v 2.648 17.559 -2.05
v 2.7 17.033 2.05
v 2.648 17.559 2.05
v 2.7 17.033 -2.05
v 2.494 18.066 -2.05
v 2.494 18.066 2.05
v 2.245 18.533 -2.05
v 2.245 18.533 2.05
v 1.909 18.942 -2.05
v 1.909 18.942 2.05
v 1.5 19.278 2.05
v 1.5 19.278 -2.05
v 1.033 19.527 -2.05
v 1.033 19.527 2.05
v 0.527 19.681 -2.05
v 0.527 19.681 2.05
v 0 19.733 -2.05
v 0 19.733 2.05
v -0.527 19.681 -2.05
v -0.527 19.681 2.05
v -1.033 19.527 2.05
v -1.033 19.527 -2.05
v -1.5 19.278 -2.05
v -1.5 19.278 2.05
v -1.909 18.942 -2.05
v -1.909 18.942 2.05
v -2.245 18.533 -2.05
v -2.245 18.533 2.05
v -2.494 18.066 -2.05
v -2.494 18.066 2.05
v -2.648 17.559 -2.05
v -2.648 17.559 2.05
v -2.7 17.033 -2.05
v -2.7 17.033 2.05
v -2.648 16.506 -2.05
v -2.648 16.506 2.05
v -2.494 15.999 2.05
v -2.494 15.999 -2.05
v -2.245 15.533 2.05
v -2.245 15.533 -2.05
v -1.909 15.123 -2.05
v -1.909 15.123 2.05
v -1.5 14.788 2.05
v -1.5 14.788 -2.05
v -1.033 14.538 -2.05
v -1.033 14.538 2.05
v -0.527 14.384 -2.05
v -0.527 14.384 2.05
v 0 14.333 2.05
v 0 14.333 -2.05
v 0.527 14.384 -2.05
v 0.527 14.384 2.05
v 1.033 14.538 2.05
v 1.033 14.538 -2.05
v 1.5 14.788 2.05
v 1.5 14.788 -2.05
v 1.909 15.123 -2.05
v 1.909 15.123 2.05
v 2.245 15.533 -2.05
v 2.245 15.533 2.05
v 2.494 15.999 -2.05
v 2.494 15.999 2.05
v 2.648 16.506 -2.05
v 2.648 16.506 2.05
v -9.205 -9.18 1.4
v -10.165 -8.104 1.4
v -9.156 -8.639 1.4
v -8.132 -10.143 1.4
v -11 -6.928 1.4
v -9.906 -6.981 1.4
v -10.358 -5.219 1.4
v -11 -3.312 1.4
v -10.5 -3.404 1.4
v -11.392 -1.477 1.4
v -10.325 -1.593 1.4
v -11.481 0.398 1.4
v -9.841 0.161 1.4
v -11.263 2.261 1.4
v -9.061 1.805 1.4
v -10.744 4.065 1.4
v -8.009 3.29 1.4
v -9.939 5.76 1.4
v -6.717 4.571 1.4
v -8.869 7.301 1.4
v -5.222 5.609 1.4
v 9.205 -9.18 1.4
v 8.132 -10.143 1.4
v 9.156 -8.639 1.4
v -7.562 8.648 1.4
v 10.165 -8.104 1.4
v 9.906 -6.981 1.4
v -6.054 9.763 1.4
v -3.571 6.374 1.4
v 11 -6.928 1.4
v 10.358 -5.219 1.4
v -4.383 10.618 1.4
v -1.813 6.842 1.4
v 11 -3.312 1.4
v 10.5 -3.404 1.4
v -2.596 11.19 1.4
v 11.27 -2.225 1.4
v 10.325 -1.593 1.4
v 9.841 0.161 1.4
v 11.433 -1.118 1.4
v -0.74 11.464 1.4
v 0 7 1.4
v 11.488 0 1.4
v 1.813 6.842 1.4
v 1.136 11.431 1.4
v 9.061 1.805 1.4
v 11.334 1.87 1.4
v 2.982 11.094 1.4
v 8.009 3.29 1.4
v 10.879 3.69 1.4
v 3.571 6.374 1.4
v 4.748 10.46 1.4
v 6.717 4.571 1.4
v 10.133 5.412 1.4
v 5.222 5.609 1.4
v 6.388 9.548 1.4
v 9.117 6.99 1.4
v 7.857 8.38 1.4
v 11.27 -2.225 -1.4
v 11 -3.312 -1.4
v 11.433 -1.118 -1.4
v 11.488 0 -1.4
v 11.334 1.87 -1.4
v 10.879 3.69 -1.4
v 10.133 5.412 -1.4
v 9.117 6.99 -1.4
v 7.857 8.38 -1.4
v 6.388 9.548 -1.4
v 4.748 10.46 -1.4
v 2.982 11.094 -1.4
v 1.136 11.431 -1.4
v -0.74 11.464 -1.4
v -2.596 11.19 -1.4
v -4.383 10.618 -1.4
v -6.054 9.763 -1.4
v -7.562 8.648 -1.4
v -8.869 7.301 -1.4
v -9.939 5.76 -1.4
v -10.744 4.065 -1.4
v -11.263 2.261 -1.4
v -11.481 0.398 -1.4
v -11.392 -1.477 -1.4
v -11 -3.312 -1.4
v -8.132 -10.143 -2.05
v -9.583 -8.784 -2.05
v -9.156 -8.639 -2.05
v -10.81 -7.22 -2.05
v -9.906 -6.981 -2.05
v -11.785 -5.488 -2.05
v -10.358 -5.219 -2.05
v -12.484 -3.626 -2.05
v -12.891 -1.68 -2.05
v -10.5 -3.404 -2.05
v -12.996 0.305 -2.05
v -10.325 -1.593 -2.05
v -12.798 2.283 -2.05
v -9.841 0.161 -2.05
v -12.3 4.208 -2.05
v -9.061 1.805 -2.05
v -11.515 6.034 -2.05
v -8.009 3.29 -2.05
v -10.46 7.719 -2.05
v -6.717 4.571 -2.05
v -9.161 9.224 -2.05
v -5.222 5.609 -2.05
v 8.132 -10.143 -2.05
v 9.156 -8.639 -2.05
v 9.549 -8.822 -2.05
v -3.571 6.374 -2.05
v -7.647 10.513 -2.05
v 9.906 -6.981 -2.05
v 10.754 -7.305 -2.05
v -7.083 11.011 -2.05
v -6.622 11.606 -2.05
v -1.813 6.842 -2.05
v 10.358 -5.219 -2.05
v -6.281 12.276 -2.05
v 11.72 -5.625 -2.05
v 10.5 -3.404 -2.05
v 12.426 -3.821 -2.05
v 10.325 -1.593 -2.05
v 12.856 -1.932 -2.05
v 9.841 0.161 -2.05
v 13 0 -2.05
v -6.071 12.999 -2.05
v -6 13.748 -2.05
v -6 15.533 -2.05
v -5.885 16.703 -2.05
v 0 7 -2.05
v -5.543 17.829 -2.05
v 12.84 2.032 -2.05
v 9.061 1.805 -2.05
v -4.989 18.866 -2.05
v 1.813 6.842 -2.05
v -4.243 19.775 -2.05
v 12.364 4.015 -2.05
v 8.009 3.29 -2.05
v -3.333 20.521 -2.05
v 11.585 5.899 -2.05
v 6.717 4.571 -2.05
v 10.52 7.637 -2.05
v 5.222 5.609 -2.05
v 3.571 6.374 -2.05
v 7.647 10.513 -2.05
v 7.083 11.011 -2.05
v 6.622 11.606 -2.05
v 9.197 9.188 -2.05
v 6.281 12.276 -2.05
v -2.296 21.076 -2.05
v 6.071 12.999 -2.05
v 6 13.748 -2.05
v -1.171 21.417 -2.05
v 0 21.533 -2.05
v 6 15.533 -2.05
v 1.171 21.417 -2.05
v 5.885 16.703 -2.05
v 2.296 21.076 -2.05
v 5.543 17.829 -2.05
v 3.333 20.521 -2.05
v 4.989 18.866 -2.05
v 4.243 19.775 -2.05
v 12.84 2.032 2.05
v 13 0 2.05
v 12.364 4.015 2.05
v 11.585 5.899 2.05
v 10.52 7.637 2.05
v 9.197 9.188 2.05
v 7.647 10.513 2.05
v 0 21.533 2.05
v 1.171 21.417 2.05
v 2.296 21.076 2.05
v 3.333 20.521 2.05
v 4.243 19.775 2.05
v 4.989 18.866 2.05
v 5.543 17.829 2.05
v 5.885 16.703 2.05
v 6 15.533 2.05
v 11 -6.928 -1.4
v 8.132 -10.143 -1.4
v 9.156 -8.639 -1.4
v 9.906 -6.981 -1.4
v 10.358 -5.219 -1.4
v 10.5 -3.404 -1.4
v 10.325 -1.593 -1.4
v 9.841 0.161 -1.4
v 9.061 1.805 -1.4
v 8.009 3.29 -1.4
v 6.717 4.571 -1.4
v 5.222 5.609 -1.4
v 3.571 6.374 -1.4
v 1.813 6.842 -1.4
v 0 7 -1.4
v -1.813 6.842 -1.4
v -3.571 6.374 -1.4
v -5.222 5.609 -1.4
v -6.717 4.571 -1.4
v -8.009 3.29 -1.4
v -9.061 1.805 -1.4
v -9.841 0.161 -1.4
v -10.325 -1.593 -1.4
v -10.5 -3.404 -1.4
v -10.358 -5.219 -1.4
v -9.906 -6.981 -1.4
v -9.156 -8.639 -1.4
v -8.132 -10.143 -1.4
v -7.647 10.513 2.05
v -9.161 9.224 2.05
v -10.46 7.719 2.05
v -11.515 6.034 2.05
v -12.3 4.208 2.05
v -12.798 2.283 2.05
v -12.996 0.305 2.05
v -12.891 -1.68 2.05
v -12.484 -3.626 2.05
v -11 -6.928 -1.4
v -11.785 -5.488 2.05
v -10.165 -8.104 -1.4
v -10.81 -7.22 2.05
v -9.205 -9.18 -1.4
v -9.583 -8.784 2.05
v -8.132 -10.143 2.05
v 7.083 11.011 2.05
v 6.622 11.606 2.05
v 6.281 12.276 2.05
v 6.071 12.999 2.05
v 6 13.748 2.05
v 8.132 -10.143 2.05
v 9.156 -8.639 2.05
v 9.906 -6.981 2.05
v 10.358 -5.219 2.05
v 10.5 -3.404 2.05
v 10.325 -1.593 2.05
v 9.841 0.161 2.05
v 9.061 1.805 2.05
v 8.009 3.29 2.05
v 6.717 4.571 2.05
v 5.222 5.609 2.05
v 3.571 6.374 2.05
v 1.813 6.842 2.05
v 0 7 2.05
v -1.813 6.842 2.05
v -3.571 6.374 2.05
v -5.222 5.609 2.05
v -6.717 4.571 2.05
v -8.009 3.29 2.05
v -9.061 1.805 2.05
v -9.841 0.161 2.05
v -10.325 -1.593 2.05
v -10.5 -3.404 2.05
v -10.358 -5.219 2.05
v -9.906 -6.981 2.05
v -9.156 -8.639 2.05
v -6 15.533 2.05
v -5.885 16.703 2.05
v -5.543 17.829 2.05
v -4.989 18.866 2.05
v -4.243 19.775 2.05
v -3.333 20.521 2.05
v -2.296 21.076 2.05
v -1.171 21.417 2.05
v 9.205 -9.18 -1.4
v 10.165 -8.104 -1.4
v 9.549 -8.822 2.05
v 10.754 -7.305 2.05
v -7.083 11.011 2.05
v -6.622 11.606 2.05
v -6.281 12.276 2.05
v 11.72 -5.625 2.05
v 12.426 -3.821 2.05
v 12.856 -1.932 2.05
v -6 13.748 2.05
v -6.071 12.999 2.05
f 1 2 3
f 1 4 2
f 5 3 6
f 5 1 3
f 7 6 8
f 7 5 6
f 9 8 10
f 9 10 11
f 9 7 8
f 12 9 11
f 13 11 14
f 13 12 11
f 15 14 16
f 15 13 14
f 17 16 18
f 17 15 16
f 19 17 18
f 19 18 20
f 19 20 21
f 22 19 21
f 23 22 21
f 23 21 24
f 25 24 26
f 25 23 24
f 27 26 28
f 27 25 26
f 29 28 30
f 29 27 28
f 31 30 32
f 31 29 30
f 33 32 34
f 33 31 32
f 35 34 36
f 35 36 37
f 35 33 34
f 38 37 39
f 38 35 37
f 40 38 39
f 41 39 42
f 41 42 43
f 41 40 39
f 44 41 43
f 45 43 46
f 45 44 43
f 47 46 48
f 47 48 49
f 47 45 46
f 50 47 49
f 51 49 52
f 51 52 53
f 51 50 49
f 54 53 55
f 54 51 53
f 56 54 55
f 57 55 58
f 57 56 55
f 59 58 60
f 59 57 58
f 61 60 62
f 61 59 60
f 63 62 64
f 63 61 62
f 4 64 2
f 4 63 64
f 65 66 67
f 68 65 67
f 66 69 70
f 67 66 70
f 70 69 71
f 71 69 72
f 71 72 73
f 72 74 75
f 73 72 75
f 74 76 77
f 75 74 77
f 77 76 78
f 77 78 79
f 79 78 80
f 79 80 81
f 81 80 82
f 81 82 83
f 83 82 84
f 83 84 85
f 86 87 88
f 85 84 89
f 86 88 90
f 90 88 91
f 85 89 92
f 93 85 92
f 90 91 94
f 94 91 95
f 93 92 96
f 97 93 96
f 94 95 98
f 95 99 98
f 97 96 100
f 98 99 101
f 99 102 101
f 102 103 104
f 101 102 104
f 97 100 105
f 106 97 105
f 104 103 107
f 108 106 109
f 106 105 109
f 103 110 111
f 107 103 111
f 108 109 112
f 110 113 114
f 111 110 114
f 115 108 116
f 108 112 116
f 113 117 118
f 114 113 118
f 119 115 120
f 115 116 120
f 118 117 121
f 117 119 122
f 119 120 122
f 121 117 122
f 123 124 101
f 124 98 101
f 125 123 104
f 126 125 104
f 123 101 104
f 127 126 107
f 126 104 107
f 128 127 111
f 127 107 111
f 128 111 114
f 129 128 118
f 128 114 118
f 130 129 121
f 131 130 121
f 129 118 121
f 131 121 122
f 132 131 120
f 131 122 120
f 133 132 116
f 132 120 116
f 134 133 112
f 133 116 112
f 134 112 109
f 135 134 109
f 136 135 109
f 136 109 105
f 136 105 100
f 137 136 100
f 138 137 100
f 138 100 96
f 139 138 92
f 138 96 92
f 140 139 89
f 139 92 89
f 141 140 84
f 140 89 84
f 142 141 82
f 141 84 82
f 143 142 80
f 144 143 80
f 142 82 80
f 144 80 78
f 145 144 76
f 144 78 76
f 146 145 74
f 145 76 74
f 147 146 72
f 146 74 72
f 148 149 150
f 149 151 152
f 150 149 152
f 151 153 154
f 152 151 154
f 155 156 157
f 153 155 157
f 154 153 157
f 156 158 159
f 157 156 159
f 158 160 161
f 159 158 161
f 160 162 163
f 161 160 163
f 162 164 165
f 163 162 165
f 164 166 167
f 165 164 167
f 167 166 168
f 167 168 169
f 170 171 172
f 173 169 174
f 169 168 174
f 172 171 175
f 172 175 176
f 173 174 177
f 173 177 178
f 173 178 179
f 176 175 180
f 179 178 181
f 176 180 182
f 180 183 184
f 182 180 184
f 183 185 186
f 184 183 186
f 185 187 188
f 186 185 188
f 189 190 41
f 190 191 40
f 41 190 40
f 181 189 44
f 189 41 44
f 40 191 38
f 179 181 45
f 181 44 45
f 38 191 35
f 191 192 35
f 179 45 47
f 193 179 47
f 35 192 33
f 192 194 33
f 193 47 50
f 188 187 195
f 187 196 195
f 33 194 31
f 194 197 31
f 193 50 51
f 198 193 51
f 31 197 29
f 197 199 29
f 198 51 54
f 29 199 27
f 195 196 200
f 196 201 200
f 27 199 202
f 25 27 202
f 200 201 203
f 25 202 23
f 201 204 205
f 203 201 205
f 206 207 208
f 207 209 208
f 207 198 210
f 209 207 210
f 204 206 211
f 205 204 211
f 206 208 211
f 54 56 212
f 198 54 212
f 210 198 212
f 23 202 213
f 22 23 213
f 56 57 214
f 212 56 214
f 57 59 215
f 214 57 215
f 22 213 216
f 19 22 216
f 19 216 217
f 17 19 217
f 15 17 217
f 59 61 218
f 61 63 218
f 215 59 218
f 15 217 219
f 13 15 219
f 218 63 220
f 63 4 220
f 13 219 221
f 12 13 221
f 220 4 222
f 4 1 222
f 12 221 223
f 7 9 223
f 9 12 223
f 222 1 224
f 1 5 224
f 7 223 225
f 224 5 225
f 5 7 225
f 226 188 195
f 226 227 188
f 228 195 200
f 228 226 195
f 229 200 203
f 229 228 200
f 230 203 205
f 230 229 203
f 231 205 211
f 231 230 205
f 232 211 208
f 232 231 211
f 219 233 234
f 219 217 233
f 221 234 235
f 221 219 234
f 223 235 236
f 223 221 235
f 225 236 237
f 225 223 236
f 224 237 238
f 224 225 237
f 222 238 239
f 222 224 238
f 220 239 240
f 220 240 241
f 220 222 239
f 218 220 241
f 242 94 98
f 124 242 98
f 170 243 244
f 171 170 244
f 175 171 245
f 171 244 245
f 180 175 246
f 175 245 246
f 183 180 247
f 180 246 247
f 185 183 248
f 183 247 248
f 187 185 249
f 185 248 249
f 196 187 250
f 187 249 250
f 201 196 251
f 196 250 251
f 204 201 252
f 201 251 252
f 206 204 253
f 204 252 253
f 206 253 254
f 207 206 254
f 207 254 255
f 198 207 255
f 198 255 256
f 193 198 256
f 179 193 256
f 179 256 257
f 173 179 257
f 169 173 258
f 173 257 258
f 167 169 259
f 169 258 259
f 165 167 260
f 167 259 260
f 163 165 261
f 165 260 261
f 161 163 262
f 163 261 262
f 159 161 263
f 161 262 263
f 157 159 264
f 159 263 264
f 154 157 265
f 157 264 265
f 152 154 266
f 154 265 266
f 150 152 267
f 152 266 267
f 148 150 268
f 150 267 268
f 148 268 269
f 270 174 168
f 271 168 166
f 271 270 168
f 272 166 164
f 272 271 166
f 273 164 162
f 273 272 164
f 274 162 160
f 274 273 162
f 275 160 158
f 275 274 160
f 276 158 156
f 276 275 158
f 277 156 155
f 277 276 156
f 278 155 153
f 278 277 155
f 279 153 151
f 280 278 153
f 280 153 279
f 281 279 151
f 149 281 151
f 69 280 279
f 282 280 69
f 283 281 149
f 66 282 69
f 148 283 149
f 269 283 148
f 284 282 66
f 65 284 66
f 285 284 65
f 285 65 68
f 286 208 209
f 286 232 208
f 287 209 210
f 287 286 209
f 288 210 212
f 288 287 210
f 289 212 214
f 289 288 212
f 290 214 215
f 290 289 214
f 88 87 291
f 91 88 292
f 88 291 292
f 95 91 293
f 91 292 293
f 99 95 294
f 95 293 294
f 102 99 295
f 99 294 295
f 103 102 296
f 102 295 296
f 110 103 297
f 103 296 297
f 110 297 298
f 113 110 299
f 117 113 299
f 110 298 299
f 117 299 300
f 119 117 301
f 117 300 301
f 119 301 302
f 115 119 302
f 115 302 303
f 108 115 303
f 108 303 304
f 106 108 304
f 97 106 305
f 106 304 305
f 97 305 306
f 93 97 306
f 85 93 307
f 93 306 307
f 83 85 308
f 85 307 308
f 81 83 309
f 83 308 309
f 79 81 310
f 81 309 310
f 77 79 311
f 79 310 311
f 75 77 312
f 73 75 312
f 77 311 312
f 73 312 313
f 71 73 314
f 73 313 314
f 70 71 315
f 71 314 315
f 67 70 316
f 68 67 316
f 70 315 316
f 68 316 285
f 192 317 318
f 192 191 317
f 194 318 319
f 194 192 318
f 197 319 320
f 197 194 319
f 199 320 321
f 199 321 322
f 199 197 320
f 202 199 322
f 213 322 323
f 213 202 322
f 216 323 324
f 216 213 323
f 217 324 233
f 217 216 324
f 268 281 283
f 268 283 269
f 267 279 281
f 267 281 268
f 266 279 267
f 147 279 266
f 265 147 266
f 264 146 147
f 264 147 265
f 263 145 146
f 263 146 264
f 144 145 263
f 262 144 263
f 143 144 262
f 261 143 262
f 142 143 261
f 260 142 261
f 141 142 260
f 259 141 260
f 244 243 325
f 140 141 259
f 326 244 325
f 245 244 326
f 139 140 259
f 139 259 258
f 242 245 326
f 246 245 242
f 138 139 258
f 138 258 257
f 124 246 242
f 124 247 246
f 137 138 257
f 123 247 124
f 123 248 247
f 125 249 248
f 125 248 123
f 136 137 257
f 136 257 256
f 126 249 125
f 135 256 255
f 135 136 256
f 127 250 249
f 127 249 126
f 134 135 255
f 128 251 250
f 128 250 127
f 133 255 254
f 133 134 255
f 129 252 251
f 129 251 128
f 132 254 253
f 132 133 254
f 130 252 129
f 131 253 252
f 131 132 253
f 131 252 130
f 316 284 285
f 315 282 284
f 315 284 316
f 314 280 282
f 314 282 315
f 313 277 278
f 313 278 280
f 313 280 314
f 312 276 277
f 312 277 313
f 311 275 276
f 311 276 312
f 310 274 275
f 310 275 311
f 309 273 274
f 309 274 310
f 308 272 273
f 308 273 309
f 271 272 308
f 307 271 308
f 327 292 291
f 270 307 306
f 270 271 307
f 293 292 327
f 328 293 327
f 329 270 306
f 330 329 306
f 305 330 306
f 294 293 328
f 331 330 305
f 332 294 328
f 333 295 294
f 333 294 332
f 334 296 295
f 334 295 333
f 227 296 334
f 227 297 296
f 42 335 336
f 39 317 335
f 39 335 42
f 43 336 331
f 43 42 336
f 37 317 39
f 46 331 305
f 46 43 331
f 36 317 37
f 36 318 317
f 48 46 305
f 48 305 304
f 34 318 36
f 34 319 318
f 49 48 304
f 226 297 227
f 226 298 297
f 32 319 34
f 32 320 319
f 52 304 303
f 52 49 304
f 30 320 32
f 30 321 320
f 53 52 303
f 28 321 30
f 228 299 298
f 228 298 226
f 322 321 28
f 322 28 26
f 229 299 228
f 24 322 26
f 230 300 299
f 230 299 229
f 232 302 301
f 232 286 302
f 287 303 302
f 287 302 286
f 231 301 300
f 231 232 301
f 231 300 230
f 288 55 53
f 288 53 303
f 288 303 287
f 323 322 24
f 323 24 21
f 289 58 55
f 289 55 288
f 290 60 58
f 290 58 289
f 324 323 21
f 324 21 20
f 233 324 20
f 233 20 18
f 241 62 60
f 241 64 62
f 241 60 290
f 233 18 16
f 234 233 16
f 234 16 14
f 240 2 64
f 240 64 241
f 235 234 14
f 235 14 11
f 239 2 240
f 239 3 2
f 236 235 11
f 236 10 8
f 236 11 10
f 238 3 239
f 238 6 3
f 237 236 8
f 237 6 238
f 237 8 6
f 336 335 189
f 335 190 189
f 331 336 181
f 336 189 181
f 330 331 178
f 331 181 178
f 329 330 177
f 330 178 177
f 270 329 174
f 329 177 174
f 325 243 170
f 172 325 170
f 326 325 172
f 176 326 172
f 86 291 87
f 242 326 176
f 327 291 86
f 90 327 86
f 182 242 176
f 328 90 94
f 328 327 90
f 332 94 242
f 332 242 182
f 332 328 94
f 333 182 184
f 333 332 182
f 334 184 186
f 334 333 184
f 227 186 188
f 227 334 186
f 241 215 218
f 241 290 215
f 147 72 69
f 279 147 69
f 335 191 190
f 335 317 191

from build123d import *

# Parameters (mm, degrees)
F0_R     = 2.7
F1_DEPTH = 2.05
F2_R     = 5.99999
F3_R     = 4
F4_R     = 10.5
F5_DEPTH = 4.101
F7_DEPTH = 1.4


# Not quite as in the source:
# - a fillet or chamfer is up to 0.001 mm smaller than in the source, because OpenCascade refuses the exact size


with BuildPart() as f1:
    # F0 (on Top) → F1 (new body, symmetric)
    with BuildSketch(Plane.XY):
        with BuildLine():
            ThreePointArc((-6, 11.5325625947), (-6.7453687816, -11.1130553854), (13, 0))
            ThreePointArc((13, 0), (11.1130553854, 6.7453687816), (6, 11.5325625947))
            Line((6, 11.5325625947), (-6, 11.5325625947))
        make_face()
        with BuildLine():
            Line((-6, 11.5325625947), (6, 11.5325625947))
            ThreePointArc((6, 11.5325625947), (0, 13), (-6, 11.5325625947))
        make_face()
        with BuildLine():
            ThreePointArc((-6, 11.5325625947), (0, 13), (6, 11.5325625947))
            Line((6, 11.5325625947), (6, 21.5325625947))
            Line((6, 21.5325625947), (-6, 21.5325625947))
            Line((-6, 21.5325625947), (-6, 11.5325625947))
        make_face()
        with Locations((0, 17.0325625947)):
            Circle(F0_R, mode=Mode.SUBTRACT)
    extrude(amount=F1_DEPTH, both=True)

    # F2 (radius 6 in the source; OpenCascade refuses exactly that, so slightly less here)
    f2_edges = [f1.edges().sort_by_distance(p)[0] for p in [
        (-6, 21.532563, 0),
        (6, 21.532563, 0),
    ]]
    fillet(f2_edges, radius=F2_R)

    # F3
    f3_edges = [f1.edges().sort_by_distance(p)[0] for p in [
        (6, 11.532563, 0),
        (-6, 11.532563, 0),
    ]]
    fillet(f3_edges, radius=F3_R)

    # F4 (on face) → F5 (cut, through all)
    with BuildSketch(Plane.XY.offset(2.05)):
        with Locations((0, -3.5)):
            Circle(F4_R)
    extrude(amount=-F5_DEPTH, mode=Mode.SUBTRACT)

    # F6 (on Top) → F7 (cut, symmetric)
    with BuildSketch(Plane.XY):
        with BuildLine():
            ThreePointArc((11, -3.3115318698), (11.3650882253, -1.6736227042), (11.4876561284, 0))
            ThreePointArc((11.4876561284, 0), (-1.6736227042, 11.3650882253), (-11, -3.3115318698))
            Line((-11, -3.3115318698), (11, -3.3115318698))
        make_face()
        with BuildLine():
            Line((11, -3.3115318698), (-11, -3.3115318698))
            ThreePointArc((-11, -3.3115318698), (0, -11.4876561284), (11, -3.3115318698))
        make_face()
        with BuildLine():
            ThreePointArc((11, -3.3115318698), (0, -11.4876561284), (-11, -3.3115318698))
            Line((-11, -3.3115318698), (-11, -30.7711608721))
            Line((-11, -30.7711608721), (11, -30.7711608721))
            Line((11, -30.7711608721), (11, -3.3115318698))
        make_face()
    extrude(amount=F7_DEPTH, both=True, mode=Mode.SUBTRACT)


solid = f1.part
